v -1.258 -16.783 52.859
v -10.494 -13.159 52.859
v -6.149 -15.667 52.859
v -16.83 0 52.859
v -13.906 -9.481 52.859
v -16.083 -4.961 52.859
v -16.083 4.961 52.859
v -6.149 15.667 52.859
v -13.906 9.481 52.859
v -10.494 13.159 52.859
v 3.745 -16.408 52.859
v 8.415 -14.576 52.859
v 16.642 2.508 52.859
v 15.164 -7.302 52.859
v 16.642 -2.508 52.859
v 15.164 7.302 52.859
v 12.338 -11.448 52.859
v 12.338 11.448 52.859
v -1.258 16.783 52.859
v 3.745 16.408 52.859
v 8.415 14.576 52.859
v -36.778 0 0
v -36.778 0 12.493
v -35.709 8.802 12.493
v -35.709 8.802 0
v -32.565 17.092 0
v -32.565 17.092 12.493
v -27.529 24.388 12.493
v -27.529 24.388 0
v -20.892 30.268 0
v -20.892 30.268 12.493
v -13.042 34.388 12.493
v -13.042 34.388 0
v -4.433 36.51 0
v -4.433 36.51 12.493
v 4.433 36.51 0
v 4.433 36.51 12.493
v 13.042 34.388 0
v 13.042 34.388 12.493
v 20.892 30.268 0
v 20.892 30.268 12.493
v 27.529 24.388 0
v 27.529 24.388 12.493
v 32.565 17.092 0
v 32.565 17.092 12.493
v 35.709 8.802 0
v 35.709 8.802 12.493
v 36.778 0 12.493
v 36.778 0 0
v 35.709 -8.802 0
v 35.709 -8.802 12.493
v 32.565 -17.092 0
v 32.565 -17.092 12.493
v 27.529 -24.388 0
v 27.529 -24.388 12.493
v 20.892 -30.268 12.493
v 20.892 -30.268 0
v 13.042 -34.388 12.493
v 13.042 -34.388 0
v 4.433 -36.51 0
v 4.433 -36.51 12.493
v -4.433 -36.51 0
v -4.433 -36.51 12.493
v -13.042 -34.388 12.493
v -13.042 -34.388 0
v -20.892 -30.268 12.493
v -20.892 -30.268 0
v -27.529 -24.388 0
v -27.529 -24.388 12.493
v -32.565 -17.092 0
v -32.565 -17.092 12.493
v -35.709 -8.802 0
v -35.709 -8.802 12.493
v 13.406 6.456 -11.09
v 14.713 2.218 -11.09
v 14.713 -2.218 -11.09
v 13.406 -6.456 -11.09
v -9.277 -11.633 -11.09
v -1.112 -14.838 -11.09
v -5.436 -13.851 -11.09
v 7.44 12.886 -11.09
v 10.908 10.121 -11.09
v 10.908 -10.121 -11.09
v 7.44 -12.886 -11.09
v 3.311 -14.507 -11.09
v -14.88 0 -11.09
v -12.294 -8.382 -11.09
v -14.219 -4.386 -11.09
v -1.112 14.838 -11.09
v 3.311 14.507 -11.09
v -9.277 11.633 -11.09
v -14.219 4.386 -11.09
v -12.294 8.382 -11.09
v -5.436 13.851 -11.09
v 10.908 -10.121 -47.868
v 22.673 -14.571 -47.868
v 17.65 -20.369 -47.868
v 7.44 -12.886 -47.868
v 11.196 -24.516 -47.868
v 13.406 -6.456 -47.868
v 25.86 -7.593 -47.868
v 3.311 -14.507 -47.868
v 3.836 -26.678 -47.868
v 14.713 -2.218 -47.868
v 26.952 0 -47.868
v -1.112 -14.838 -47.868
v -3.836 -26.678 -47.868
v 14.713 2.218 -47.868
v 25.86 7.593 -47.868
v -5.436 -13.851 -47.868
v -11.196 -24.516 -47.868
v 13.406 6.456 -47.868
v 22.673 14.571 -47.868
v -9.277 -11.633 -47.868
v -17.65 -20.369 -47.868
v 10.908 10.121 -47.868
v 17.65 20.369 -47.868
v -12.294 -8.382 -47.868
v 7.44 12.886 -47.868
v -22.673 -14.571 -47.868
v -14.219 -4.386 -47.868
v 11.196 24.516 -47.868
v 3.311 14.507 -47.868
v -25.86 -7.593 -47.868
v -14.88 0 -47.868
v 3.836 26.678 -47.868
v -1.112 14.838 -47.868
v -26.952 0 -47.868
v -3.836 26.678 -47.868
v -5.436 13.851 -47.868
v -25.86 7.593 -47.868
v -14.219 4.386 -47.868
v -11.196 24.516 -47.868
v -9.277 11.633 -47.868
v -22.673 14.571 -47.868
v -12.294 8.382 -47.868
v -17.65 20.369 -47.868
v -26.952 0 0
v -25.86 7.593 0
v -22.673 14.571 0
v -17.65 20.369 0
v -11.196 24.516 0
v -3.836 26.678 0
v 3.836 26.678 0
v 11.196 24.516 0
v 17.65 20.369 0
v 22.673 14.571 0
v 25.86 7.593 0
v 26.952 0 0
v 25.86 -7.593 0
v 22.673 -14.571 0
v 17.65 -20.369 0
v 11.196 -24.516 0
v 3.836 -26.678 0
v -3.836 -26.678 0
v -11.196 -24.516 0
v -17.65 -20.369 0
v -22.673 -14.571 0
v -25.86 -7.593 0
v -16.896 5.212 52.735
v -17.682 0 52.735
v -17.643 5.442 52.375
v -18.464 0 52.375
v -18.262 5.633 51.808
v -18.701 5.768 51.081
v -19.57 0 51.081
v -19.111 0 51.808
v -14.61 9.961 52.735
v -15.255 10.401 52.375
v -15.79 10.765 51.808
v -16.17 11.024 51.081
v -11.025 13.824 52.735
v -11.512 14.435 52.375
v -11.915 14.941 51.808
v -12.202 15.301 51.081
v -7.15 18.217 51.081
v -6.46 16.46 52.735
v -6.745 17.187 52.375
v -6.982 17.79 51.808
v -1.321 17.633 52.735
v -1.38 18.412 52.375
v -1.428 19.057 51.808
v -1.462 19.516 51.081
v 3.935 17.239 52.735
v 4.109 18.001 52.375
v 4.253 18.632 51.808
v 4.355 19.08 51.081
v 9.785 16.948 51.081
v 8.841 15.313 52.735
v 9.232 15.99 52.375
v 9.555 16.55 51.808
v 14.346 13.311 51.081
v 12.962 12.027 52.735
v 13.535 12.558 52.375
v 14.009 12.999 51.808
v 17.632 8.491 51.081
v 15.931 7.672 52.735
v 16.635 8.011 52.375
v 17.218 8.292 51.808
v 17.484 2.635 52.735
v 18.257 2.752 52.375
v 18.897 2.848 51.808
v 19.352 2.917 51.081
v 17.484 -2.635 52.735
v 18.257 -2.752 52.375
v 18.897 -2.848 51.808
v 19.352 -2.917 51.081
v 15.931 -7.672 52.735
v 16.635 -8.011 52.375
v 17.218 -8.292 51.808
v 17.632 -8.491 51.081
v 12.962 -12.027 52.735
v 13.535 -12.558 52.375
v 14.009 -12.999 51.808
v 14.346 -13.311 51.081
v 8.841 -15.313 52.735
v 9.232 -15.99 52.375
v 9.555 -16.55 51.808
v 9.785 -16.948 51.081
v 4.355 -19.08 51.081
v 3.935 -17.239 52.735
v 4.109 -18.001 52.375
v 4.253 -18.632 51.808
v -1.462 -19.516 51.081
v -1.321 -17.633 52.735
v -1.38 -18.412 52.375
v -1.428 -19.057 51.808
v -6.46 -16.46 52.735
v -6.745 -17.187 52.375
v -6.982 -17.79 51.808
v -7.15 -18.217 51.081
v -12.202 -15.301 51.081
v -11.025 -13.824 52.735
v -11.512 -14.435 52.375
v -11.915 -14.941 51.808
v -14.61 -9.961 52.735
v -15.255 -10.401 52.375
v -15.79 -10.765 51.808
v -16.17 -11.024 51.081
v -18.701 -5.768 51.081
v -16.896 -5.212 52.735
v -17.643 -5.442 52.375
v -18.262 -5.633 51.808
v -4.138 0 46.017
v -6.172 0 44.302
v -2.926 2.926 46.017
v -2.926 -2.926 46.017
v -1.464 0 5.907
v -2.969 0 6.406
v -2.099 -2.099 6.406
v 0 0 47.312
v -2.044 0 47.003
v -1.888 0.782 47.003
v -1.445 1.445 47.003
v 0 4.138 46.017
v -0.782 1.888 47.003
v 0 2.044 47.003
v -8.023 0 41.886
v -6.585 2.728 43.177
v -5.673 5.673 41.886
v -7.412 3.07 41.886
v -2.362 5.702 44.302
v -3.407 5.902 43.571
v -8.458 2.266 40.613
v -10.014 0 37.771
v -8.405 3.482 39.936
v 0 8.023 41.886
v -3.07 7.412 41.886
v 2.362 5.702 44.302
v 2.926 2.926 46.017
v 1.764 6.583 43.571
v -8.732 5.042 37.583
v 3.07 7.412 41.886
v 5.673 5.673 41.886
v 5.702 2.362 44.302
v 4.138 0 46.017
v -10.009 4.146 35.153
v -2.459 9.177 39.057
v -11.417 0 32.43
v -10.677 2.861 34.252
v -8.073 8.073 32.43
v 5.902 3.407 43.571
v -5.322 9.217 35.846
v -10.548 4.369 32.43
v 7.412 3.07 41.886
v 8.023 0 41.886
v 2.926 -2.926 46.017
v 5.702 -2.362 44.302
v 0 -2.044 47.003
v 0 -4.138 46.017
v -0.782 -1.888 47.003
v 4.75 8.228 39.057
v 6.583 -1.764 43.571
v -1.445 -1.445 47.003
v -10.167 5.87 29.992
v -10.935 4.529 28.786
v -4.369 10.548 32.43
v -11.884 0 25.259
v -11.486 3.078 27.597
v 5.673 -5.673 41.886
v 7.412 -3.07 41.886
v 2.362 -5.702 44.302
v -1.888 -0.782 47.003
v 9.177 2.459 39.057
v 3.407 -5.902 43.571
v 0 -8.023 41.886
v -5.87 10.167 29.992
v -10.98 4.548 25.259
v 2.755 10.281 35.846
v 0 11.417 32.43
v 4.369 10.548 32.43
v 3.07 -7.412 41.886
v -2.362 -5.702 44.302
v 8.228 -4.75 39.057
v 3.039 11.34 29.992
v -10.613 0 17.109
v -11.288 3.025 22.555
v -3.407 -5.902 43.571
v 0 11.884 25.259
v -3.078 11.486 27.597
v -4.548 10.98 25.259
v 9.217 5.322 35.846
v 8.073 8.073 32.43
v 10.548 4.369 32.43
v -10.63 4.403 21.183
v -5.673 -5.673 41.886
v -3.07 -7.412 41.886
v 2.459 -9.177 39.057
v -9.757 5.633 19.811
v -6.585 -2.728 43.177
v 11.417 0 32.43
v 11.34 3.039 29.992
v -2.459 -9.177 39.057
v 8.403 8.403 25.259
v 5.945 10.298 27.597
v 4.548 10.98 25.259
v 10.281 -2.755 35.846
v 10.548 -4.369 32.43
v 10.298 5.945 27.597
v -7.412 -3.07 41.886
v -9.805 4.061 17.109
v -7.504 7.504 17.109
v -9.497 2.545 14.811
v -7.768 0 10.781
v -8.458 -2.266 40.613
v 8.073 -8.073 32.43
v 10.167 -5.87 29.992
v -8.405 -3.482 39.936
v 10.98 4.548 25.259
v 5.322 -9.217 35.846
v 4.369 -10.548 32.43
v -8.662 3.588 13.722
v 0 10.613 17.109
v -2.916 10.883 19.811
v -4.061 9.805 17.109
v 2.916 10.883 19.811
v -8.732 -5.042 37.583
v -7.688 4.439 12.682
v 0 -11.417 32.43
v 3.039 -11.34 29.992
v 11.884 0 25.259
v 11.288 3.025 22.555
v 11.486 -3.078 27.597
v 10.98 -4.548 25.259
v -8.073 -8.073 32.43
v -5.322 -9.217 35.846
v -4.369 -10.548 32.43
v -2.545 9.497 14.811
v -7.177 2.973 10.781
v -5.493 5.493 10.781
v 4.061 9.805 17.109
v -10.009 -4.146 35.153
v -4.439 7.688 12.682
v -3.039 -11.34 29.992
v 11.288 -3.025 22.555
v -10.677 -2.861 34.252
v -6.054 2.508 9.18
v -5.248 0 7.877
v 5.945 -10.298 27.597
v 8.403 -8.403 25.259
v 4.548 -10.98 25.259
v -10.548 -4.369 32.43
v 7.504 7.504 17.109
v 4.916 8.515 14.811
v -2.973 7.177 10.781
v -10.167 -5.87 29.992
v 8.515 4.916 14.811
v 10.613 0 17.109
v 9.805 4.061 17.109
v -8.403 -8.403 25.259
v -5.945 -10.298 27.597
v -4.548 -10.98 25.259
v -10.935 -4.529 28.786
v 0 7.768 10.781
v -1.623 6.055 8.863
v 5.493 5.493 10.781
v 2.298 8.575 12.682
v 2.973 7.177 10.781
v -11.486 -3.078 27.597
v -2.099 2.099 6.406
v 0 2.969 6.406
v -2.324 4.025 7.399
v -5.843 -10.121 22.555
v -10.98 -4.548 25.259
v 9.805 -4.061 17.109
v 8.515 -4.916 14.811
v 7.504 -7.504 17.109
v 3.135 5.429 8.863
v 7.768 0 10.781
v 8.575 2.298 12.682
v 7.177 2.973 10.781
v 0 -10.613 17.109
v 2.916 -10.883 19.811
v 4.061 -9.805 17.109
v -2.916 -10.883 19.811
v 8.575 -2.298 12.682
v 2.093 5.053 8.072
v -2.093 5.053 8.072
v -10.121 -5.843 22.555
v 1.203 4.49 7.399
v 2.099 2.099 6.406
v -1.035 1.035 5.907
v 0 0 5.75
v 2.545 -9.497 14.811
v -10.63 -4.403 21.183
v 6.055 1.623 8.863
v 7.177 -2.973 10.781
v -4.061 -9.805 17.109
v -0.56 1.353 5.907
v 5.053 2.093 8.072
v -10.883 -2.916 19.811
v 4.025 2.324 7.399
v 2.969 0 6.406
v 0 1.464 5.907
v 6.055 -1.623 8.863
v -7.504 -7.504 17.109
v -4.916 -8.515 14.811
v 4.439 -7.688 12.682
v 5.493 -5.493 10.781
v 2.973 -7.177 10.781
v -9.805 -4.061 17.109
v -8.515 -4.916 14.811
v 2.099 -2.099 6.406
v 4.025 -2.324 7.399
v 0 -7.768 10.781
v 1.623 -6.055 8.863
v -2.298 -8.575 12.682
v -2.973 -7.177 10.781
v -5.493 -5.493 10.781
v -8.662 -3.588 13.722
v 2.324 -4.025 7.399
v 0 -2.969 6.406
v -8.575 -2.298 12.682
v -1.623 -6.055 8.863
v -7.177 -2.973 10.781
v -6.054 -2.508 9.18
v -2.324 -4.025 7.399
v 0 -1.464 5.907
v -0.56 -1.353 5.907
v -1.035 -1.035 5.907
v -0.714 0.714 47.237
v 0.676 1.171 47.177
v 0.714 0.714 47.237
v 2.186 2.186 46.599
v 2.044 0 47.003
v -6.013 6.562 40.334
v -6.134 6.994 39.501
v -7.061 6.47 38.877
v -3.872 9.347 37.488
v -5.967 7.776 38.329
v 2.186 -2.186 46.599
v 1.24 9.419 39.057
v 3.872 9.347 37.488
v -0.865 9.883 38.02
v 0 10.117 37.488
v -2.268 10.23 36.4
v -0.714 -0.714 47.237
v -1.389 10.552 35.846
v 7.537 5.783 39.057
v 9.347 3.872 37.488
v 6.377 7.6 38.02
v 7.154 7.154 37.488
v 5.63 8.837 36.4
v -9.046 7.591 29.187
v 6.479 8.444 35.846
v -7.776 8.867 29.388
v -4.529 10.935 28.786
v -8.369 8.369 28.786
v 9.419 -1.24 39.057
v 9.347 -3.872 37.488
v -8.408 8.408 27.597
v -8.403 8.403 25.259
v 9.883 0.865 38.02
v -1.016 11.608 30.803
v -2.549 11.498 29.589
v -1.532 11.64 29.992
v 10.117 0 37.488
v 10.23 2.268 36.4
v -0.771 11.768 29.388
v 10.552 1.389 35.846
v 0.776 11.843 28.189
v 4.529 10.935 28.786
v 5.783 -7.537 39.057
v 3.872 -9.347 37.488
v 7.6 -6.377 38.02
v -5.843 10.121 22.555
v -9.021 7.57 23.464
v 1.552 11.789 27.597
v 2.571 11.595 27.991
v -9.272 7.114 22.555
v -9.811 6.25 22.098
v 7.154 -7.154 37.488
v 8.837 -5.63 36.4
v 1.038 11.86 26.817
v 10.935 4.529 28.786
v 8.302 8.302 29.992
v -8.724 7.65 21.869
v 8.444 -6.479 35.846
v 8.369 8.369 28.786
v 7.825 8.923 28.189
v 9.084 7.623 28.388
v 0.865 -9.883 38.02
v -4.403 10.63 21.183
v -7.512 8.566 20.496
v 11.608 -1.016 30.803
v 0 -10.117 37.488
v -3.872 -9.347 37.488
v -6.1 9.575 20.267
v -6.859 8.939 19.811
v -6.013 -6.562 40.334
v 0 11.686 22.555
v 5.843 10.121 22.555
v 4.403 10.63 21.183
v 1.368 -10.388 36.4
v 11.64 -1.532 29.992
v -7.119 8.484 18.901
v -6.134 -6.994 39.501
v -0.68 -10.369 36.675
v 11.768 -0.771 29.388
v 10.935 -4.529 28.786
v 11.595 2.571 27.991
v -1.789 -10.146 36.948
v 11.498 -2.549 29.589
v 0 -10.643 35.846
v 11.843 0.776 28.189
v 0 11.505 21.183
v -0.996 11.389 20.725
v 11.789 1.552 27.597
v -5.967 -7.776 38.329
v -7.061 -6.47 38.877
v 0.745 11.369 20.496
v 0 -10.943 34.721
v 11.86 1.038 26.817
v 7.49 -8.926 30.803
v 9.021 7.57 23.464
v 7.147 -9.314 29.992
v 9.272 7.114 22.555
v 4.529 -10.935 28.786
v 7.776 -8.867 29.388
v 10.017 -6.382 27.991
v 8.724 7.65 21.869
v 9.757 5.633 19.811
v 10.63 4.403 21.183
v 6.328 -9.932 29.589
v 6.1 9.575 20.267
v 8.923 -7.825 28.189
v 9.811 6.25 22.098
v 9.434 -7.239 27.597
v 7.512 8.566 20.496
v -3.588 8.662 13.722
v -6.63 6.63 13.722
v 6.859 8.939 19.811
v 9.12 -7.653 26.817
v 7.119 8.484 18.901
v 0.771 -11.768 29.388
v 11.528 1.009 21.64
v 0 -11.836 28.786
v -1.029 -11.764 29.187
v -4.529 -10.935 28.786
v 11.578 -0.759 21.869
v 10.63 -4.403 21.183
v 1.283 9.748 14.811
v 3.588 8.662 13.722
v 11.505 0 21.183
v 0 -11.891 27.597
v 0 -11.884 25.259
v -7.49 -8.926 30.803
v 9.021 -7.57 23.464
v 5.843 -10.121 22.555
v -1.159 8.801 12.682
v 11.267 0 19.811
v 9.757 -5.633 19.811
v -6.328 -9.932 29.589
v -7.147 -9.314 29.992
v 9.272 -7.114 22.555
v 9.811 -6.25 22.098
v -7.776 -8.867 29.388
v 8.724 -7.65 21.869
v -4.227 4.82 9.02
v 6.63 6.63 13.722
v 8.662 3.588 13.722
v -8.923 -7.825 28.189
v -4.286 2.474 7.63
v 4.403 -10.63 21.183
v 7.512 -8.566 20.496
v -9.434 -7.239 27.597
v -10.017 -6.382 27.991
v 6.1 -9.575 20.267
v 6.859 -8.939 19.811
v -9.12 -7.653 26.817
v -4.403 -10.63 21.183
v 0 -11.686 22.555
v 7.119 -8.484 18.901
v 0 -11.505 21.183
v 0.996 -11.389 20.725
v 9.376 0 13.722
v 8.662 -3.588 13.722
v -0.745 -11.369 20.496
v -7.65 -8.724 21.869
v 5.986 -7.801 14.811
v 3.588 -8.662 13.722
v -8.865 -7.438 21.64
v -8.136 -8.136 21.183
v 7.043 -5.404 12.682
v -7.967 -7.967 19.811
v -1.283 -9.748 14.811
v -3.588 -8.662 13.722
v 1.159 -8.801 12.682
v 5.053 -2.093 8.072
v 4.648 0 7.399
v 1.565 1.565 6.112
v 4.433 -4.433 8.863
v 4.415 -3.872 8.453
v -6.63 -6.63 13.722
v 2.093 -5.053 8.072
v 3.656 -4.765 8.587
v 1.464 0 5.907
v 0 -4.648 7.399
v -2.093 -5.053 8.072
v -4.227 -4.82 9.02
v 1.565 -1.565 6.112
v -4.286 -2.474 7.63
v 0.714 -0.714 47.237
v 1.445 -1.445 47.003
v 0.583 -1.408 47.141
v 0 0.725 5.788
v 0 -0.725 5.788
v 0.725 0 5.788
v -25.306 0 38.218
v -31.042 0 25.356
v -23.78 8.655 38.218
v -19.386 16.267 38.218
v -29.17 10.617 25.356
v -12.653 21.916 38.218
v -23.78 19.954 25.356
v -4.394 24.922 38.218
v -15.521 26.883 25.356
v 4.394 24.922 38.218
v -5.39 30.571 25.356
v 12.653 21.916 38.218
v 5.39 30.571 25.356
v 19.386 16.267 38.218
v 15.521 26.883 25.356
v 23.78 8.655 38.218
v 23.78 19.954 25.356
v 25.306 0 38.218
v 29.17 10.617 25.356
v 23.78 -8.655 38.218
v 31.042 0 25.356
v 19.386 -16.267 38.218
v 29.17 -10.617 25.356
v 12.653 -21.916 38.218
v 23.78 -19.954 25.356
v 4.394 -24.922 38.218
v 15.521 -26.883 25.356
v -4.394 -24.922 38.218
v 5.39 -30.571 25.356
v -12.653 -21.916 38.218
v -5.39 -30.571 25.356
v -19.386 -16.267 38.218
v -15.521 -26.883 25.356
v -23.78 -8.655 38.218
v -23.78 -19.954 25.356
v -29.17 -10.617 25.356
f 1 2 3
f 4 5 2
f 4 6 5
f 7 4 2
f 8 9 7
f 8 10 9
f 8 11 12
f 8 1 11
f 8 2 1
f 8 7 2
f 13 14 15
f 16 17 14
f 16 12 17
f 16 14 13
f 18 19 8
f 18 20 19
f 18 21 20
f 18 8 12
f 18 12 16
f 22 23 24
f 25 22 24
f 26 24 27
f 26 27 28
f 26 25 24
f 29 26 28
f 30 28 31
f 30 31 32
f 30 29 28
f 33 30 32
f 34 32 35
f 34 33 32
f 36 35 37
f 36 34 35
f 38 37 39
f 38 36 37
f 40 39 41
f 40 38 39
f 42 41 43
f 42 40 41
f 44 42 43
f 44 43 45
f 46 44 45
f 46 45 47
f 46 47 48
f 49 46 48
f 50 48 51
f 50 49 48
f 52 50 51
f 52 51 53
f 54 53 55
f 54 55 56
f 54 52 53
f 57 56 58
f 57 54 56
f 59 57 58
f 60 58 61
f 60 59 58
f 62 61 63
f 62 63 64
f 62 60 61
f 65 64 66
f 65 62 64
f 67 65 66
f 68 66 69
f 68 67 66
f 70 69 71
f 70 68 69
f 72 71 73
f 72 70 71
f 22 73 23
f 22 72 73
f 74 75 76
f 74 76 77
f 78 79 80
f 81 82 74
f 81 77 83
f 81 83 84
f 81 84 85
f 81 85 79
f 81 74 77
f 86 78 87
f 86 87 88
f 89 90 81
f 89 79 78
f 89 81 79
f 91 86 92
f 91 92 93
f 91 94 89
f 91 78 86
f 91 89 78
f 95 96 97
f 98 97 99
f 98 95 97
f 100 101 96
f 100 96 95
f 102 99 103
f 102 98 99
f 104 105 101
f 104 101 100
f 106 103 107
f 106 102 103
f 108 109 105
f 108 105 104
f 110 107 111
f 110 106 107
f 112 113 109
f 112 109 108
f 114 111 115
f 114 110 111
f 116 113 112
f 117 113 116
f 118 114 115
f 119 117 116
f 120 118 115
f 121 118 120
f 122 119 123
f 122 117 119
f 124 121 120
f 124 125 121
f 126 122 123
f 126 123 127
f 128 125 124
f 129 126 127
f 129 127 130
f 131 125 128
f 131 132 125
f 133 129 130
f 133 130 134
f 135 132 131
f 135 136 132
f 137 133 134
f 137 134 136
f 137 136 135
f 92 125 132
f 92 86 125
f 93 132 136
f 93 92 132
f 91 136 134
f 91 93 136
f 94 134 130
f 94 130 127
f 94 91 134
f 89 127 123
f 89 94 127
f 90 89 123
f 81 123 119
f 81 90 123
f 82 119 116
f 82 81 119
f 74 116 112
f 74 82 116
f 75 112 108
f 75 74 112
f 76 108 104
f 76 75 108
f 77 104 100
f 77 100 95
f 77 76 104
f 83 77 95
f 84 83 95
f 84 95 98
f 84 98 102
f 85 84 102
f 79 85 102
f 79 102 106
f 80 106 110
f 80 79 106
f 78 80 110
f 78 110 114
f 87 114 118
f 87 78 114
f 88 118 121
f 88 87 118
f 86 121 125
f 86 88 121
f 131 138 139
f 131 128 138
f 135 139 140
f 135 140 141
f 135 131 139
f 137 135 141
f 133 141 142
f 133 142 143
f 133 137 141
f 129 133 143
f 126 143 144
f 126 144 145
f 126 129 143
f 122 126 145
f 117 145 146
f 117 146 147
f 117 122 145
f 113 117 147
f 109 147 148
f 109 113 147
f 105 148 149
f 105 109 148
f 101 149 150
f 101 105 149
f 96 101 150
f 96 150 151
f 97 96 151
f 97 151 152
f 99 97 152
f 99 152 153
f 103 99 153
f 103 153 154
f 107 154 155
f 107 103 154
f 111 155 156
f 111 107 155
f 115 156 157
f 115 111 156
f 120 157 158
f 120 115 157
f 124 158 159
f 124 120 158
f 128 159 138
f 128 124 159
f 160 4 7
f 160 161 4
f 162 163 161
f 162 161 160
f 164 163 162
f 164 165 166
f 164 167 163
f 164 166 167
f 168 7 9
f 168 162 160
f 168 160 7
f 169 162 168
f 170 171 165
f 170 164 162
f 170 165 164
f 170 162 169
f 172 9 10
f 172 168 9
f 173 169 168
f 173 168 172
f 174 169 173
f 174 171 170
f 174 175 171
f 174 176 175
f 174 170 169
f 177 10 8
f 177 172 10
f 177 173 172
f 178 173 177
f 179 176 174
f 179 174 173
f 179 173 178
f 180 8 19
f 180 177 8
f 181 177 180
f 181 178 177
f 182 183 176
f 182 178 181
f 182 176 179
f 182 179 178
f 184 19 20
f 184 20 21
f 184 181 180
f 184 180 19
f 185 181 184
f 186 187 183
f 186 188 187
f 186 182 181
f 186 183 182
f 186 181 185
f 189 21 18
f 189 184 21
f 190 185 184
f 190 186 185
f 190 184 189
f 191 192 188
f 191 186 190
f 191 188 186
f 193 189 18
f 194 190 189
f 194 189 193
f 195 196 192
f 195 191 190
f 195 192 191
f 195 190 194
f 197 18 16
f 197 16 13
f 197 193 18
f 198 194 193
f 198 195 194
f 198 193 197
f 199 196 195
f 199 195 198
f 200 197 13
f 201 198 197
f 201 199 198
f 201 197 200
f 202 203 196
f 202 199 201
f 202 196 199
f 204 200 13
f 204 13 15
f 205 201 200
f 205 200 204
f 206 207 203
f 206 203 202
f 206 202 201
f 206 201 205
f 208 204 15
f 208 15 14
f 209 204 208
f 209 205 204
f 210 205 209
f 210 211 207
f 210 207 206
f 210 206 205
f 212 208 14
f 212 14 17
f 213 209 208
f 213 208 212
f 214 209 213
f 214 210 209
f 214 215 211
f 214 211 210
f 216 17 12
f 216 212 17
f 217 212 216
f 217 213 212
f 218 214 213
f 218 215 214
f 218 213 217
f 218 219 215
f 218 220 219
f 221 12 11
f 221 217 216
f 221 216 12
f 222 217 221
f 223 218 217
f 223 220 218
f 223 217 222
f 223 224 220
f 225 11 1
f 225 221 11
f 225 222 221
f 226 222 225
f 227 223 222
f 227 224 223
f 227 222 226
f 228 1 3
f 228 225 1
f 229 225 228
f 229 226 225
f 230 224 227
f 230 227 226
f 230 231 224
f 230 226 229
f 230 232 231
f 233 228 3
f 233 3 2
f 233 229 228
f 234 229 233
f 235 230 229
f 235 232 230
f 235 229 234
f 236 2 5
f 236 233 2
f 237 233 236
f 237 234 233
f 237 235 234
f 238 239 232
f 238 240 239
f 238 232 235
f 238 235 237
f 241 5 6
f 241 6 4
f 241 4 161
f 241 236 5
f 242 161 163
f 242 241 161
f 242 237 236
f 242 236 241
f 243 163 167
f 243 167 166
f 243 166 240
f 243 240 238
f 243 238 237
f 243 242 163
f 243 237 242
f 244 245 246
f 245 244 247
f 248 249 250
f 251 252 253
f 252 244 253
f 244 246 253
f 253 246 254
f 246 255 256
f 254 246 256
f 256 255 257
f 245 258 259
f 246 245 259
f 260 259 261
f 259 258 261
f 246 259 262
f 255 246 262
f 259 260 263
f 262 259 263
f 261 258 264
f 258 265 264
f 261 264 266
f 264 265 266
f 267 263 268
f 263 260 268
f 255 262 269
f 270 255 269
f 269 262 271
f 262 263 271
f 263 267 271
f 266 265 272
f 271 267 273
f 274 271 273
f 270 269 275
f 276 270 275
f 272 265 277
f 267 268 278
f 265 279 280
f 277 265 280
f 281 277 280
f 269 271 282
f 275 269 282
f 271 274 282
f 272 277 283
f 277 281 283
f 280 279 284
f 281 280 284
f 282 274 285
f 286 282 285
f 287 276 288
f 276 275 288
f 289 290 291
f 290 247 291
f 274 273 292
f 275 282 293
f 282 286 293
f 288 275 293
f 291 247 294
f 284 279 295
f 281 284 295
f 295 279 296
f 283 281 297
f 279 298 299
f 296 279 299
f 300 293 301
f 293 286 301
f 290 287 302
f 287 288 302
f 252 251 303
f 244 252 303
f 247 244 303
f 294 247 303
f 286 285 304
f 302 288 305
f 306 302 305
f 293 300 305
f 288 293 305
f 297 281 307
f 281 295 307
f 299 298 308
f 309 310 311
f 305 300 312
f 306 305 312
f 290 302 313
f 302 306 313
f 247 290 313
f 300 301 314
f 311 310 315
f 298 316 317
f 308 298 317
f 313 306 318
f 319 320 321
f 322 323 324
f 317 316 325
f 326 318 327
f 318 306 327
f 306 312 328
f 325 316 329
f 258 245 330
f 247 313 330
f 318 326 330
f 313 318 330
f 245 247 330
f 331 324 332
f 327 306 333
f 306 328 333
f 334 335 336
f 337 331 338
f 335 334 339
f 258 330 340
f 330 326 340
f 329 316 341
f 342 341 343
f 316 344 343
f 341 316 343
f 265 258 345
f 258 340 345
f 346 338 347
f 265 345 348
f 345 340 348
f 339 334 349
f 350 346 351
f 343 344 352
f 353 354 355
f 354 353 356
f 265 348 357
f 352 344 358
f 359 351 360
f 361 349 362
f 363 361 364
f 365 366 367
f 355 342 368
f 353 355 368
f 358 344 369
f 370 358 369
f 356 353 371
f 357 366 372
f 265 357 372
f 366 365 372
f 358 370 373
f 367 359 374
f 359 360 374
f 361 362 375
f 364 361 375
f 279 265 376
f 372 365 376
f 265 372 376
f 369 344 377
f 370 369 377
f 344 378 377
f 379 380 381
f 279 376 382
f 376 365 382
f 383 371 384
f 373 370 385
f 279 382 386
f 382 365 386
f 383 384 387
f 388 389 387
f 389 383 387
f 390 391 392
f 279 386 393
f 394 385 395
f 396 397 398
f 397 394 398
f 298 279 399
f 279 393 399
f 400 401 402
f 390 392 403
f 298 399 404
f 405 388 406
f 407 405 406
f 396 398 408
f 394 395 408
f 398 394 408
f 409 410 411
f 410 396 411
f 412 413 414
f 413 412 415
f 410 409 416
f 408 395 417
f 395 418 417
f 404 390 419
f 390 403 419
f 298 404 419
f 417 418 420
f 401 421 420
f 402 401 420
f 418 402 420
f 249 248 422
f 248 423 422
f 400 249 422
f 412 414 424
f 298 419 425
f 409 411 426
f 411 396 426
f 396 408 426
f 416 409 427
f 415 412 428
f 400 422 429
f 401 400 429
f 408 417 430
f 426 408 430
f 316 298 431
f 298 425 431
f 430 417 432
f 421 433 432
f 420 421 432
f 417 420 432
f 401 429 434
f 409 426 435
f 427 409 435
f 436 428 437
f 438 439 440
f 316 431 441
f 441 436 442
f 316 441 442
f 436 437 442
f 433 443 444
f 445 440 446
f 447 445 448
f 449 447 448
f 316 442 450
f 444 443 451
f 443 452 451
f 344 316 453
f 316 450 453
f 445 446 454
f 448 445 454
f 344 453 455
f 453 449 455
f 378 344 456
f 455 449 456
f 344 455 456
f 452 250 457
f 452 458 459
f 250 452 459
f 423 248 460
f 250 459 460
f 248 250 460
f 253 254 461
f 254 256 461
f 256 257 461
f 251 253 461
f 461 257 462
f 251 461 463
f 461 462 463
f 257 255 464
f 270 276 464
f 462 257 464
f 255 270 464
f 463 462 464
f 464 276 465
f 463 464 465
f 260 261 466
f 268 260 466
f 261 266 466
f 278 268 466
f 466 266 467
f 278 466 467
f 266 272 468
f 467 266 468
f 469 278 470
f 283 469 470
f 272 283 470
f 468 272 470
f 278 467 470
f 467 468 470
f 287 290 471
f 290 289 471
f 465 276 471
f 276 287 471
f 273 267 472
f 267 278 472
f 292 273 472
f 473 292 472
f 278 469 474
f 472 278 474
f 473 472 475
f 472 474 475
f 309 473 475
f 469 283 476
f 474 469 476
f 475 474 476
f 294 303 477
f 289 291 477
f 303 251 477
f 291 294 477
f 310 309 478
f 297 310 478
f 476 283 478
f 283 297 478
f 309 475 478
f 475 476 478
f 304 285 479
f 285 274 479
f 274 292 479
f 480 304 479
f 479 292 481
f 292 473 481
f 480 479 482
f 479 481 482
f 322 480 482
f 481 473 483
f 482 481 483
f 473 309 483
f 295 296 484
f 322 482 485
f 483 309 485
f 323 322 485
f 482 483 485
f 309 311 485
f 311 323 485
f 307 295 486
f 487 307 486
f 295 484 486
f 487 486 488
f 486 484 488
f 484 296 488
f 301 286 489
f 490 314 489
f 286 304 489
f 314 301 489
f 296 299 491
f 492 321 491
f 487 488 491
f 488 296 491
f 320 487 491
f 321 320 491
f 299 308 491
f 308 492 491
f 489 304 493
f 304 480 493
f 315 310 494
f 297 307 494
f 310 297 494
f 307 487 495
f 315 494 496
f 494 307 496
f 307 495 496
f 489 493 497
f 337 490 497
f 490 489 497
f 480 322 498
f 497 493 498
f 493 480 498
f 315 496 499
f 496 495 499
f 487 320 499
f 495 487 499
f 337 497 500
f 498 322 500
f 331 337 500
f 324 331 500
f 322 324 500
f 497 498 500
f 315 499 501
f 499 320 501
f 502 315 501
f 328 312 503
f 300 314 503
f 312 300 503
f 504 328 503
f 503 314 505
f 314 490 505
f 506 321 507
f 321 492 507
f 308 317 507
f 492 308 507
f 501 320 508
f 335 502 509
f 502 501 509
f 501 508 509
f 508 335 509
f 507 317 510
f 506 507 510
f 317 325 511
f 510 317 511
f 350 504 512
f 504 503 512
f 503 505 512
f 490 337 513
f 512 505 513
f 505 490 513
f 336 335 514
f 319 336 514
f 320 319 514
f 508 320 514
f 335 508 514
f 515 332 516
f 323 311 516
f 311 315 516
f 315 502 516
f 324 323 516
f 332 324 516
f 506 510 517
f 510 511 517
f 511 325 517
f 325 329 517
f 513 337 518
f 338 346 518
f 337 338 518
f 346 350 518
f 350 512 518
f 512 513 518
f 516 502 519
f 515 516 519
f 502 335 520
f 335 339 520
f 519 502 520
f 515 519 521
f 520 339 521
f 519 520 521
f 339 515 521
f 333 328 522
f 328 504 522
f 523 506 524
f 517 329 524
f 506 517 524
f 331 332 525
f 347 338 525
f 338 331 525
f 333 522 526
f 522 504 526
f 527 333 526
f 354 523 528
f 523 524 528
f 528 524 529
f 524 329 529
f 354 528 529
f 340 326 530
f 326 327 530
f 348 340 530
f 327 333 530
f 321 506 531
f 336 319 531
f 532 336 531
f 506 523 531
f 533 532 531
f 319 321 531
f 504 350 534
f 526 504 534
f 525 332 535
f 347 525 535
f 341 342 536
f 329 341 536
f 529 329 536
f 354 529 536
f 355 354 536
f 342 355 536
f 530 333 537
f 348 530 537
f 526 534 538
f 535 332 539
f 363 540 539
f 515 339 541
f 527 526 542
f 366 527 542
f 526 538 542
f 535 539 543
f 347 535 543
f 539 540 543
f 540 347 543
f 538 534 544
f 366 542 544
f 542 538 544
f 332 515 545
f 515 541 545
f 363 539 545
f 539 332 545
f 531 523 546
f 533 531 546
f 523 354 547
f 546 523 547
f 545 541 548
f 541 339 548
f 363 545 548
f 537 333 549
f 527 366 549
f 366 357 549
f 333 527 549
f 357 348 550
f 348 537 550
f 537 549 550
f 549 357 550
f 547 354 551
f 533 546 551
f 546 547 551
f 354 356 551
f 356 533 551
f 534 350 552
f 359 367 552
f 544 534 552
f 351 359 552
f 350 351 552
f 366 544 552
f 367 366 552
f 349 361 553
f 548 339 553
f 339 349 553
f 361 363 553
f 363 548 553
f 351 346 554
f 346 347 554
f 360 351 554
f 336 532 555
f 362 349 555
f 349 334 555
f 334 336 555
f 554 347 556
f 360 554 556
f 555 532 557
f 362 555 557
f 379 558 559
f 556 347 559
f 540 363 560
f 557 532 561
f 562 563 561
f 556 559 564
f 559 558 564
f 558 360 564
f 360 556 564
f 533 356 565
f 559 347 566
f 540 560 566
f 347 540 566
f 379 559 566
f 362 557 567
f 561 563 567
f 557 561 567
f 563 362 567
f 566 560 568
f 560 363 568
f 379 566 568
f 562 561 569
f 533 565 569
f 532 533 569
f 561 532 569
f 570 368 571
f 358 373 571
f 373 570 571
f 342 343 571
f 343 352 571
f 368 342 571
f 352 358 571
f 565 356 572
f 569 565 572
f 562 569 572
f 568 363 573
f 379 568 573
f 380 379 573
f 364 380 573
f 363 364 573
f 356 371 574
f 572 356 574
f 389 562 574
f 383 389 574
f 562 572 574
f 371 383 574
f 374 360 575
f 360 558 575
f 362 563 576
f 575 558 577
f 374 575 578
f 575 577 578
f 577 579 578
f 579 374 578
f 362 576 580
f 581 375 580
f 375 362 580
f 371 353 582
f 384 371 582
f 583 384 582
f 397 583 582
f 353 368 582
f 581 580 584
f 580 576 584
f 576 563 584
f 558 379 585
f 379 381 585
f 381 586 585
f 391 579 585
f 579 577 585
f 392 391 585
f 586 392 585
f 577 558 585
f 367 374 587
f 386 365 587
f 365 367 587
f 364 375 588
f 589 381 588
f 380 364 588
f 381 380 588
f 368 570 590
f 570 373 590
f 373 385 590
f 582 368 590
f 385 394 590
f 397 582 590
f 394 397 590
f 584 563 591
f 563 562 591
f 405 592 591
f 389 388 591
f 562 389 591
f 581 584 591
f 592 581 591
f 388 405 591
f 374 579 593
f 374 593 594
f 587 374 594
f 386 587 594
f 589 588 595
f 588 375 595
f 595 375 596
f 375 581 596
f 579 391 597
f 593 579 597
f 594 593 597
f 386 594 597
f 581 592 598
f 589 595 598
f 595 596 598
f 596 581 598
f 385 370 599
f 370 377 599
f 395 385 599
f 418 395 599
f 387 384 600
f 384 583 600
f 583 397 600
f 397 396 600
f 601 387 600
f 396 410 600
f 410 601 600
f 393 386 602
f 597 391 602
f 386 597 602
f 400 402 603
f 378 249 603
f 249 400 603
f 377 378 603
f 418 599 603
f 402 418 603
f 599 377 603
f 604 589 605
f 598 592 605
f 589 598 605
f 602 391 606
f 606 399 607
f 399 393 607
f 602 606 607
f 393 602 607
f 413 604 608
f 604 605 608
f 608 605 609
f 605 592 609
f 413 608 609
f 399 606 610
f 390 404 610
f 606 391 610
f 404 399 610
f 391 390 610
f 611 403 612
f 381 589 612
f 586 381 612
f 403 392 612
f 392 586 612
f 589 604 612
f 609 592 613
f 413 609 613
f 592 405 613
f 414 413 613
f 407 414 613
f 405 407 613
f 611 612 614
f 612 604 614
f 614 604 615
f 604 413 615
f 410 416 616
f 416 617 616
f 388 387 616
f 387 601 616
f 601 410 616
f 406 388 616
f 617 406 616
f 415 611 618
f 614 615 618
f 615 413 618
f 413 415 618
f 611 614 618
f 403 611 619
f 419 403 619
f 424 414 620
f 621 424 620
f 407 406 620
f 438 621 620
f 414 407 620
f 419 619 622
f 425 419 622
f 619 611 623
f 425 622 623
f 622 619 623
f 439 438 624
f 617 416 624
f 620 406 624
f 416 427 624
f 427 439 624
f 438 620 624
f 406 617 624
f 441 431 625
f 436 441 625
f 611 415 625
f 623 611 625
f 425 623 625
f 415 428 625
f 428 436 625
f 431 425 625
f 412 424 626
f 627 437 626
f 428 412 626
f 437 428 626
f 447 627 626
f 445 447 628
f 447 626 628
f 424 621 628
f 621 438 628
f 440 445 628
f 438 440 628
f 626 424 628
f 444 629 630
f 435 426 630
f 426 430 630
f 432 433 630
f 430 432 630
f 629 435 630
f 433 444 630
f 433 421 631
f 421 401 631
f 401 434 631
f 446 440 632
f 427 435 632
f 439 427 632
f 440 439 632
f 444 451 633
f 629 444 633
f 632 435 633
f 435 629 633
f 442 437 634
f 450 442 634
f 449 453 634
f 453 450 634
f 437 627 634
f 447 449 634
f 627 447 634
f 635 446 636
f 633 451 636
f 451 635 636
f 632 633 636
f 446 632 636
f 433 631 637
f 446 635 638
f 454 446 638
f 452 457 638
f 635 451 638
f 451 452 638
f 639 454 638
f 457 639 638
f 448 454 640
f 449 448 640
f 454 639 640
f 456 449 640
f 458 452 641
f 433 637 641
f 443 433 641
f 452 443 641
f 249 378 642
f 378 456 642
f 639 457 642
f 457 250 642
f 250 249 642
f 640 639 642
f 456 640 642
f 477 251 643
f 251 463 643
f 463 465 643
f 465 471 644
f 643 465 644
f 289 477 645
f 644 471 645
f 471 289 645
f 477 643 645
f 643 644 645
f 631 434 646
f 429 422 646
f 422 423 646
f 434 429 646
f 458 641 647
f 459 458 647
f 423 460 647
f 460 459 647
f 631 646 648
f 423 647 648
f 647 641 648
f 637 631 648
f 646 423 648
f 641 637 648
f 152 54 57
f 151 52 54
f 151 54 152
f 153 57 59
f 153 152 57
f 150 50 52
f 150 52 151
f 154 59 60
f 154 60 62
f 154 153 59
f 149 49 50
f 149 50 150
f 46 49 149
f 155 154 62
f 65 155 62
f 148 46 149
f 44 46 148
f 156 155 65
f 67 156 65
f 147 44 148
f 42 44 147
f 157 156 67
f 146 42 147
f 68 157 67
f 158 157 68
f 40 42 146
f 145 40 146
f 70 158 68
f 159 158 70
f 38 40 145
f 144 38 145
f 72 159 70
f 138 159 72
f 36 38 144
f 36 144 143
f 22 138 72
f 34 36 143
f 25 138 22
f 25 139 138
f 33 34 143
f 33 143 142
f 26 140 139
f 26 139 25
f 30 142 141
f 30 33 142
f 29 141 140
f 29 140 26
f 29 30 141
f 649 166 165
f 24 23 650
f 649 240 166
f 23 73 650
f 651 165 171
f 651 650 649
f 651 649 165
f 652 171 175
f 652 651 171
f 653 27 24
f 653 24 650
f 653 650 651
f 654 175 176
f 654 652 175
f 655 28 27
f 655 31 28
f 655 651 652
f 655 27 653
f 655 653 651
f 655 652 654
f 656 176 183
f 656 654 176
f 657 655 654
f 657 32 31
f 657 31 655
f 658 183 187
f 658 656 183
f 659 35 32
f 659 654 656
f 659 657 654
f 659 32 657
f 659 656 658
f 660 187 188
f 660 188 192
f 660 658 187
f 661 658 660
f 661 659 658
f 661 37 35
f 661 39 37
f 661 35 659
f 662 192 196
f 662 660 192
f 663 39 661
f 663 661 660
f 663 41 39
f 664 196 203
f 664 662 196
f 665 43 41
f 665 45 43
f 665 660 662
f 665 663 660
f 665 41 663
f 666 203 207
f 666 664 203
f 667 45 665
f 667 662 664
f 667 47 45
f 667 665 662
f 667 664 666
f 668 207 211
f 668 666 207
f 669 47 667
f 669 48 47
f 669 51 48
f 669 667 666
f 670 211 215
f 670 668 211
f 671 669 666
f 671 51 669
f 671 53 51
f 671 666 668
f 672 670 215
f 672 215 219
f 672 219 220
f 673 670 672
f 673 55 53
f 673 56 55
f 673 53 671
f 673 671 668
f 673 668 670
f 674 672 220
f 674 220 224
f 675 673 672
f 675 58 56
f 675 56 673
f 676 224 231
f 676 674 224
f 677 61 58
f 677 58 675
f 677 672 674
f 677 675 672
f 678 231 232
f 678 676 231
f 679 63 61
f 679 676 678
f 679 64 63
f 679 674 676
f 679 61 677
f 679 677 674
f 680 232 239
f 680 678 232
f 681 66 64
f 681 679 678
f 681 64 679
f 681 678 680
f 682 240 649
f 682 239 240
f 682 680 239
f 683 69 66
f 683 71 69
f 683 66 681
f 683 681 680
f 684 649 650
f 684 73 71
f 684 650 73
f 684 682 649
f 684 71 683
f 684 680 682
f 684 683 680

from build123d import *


with BuildPart() as f1:
    # F0 (on Front) → F1 (revolve)
    with BuildSketch(Plane.XZ):
        with BuildLine():
            Line((-26.951872, -47.867652), (-14.87968, -47.867652))
            Line((-14.87968, -47.867652), (-14.87968, -11.089573))
            Line((-14.87968, -11.089573), (0, -11.089573))
            Line((0, -11.089573), (0, 5.749613))
            add(Edge.make_bspline(
                [(0, 47.311883), (-11.906475, 47.311883), (-11.906475, 26.530748), (-11.906475, 5.749613), (0, 5.749613)],
                knots=[3.141593, 3.141593, 3.141593, 4.712389, 4.712389, 6.283185, 6.283185, 6.283185], degree=2, weights=[1, 0.707107, 1, 0.707107, 1]))
            Line((0, 47.311883), (0, 52.858687))
            Line((0, 52.858687), (-16.830357, 52.858687))
            ThreePointArc((-16.830357, 52.858687), (-18.463521, 52.375187), (-19.570262, 51.080536))
            Line((-19.570262, 51.080536), (-36.778077, 12.493316))
            Line((-36.778077, 12.493316), (-36.778077, 0))
            Line((-36.778077, 0), (-26.951872, 0))
            Line((-26.951872, 0), (-26.951872, -47.867652))
        make_face()
    revolve(axis=Axis((0, 0, 20.884557), (0, 0, -1)))


solid = f1.part
